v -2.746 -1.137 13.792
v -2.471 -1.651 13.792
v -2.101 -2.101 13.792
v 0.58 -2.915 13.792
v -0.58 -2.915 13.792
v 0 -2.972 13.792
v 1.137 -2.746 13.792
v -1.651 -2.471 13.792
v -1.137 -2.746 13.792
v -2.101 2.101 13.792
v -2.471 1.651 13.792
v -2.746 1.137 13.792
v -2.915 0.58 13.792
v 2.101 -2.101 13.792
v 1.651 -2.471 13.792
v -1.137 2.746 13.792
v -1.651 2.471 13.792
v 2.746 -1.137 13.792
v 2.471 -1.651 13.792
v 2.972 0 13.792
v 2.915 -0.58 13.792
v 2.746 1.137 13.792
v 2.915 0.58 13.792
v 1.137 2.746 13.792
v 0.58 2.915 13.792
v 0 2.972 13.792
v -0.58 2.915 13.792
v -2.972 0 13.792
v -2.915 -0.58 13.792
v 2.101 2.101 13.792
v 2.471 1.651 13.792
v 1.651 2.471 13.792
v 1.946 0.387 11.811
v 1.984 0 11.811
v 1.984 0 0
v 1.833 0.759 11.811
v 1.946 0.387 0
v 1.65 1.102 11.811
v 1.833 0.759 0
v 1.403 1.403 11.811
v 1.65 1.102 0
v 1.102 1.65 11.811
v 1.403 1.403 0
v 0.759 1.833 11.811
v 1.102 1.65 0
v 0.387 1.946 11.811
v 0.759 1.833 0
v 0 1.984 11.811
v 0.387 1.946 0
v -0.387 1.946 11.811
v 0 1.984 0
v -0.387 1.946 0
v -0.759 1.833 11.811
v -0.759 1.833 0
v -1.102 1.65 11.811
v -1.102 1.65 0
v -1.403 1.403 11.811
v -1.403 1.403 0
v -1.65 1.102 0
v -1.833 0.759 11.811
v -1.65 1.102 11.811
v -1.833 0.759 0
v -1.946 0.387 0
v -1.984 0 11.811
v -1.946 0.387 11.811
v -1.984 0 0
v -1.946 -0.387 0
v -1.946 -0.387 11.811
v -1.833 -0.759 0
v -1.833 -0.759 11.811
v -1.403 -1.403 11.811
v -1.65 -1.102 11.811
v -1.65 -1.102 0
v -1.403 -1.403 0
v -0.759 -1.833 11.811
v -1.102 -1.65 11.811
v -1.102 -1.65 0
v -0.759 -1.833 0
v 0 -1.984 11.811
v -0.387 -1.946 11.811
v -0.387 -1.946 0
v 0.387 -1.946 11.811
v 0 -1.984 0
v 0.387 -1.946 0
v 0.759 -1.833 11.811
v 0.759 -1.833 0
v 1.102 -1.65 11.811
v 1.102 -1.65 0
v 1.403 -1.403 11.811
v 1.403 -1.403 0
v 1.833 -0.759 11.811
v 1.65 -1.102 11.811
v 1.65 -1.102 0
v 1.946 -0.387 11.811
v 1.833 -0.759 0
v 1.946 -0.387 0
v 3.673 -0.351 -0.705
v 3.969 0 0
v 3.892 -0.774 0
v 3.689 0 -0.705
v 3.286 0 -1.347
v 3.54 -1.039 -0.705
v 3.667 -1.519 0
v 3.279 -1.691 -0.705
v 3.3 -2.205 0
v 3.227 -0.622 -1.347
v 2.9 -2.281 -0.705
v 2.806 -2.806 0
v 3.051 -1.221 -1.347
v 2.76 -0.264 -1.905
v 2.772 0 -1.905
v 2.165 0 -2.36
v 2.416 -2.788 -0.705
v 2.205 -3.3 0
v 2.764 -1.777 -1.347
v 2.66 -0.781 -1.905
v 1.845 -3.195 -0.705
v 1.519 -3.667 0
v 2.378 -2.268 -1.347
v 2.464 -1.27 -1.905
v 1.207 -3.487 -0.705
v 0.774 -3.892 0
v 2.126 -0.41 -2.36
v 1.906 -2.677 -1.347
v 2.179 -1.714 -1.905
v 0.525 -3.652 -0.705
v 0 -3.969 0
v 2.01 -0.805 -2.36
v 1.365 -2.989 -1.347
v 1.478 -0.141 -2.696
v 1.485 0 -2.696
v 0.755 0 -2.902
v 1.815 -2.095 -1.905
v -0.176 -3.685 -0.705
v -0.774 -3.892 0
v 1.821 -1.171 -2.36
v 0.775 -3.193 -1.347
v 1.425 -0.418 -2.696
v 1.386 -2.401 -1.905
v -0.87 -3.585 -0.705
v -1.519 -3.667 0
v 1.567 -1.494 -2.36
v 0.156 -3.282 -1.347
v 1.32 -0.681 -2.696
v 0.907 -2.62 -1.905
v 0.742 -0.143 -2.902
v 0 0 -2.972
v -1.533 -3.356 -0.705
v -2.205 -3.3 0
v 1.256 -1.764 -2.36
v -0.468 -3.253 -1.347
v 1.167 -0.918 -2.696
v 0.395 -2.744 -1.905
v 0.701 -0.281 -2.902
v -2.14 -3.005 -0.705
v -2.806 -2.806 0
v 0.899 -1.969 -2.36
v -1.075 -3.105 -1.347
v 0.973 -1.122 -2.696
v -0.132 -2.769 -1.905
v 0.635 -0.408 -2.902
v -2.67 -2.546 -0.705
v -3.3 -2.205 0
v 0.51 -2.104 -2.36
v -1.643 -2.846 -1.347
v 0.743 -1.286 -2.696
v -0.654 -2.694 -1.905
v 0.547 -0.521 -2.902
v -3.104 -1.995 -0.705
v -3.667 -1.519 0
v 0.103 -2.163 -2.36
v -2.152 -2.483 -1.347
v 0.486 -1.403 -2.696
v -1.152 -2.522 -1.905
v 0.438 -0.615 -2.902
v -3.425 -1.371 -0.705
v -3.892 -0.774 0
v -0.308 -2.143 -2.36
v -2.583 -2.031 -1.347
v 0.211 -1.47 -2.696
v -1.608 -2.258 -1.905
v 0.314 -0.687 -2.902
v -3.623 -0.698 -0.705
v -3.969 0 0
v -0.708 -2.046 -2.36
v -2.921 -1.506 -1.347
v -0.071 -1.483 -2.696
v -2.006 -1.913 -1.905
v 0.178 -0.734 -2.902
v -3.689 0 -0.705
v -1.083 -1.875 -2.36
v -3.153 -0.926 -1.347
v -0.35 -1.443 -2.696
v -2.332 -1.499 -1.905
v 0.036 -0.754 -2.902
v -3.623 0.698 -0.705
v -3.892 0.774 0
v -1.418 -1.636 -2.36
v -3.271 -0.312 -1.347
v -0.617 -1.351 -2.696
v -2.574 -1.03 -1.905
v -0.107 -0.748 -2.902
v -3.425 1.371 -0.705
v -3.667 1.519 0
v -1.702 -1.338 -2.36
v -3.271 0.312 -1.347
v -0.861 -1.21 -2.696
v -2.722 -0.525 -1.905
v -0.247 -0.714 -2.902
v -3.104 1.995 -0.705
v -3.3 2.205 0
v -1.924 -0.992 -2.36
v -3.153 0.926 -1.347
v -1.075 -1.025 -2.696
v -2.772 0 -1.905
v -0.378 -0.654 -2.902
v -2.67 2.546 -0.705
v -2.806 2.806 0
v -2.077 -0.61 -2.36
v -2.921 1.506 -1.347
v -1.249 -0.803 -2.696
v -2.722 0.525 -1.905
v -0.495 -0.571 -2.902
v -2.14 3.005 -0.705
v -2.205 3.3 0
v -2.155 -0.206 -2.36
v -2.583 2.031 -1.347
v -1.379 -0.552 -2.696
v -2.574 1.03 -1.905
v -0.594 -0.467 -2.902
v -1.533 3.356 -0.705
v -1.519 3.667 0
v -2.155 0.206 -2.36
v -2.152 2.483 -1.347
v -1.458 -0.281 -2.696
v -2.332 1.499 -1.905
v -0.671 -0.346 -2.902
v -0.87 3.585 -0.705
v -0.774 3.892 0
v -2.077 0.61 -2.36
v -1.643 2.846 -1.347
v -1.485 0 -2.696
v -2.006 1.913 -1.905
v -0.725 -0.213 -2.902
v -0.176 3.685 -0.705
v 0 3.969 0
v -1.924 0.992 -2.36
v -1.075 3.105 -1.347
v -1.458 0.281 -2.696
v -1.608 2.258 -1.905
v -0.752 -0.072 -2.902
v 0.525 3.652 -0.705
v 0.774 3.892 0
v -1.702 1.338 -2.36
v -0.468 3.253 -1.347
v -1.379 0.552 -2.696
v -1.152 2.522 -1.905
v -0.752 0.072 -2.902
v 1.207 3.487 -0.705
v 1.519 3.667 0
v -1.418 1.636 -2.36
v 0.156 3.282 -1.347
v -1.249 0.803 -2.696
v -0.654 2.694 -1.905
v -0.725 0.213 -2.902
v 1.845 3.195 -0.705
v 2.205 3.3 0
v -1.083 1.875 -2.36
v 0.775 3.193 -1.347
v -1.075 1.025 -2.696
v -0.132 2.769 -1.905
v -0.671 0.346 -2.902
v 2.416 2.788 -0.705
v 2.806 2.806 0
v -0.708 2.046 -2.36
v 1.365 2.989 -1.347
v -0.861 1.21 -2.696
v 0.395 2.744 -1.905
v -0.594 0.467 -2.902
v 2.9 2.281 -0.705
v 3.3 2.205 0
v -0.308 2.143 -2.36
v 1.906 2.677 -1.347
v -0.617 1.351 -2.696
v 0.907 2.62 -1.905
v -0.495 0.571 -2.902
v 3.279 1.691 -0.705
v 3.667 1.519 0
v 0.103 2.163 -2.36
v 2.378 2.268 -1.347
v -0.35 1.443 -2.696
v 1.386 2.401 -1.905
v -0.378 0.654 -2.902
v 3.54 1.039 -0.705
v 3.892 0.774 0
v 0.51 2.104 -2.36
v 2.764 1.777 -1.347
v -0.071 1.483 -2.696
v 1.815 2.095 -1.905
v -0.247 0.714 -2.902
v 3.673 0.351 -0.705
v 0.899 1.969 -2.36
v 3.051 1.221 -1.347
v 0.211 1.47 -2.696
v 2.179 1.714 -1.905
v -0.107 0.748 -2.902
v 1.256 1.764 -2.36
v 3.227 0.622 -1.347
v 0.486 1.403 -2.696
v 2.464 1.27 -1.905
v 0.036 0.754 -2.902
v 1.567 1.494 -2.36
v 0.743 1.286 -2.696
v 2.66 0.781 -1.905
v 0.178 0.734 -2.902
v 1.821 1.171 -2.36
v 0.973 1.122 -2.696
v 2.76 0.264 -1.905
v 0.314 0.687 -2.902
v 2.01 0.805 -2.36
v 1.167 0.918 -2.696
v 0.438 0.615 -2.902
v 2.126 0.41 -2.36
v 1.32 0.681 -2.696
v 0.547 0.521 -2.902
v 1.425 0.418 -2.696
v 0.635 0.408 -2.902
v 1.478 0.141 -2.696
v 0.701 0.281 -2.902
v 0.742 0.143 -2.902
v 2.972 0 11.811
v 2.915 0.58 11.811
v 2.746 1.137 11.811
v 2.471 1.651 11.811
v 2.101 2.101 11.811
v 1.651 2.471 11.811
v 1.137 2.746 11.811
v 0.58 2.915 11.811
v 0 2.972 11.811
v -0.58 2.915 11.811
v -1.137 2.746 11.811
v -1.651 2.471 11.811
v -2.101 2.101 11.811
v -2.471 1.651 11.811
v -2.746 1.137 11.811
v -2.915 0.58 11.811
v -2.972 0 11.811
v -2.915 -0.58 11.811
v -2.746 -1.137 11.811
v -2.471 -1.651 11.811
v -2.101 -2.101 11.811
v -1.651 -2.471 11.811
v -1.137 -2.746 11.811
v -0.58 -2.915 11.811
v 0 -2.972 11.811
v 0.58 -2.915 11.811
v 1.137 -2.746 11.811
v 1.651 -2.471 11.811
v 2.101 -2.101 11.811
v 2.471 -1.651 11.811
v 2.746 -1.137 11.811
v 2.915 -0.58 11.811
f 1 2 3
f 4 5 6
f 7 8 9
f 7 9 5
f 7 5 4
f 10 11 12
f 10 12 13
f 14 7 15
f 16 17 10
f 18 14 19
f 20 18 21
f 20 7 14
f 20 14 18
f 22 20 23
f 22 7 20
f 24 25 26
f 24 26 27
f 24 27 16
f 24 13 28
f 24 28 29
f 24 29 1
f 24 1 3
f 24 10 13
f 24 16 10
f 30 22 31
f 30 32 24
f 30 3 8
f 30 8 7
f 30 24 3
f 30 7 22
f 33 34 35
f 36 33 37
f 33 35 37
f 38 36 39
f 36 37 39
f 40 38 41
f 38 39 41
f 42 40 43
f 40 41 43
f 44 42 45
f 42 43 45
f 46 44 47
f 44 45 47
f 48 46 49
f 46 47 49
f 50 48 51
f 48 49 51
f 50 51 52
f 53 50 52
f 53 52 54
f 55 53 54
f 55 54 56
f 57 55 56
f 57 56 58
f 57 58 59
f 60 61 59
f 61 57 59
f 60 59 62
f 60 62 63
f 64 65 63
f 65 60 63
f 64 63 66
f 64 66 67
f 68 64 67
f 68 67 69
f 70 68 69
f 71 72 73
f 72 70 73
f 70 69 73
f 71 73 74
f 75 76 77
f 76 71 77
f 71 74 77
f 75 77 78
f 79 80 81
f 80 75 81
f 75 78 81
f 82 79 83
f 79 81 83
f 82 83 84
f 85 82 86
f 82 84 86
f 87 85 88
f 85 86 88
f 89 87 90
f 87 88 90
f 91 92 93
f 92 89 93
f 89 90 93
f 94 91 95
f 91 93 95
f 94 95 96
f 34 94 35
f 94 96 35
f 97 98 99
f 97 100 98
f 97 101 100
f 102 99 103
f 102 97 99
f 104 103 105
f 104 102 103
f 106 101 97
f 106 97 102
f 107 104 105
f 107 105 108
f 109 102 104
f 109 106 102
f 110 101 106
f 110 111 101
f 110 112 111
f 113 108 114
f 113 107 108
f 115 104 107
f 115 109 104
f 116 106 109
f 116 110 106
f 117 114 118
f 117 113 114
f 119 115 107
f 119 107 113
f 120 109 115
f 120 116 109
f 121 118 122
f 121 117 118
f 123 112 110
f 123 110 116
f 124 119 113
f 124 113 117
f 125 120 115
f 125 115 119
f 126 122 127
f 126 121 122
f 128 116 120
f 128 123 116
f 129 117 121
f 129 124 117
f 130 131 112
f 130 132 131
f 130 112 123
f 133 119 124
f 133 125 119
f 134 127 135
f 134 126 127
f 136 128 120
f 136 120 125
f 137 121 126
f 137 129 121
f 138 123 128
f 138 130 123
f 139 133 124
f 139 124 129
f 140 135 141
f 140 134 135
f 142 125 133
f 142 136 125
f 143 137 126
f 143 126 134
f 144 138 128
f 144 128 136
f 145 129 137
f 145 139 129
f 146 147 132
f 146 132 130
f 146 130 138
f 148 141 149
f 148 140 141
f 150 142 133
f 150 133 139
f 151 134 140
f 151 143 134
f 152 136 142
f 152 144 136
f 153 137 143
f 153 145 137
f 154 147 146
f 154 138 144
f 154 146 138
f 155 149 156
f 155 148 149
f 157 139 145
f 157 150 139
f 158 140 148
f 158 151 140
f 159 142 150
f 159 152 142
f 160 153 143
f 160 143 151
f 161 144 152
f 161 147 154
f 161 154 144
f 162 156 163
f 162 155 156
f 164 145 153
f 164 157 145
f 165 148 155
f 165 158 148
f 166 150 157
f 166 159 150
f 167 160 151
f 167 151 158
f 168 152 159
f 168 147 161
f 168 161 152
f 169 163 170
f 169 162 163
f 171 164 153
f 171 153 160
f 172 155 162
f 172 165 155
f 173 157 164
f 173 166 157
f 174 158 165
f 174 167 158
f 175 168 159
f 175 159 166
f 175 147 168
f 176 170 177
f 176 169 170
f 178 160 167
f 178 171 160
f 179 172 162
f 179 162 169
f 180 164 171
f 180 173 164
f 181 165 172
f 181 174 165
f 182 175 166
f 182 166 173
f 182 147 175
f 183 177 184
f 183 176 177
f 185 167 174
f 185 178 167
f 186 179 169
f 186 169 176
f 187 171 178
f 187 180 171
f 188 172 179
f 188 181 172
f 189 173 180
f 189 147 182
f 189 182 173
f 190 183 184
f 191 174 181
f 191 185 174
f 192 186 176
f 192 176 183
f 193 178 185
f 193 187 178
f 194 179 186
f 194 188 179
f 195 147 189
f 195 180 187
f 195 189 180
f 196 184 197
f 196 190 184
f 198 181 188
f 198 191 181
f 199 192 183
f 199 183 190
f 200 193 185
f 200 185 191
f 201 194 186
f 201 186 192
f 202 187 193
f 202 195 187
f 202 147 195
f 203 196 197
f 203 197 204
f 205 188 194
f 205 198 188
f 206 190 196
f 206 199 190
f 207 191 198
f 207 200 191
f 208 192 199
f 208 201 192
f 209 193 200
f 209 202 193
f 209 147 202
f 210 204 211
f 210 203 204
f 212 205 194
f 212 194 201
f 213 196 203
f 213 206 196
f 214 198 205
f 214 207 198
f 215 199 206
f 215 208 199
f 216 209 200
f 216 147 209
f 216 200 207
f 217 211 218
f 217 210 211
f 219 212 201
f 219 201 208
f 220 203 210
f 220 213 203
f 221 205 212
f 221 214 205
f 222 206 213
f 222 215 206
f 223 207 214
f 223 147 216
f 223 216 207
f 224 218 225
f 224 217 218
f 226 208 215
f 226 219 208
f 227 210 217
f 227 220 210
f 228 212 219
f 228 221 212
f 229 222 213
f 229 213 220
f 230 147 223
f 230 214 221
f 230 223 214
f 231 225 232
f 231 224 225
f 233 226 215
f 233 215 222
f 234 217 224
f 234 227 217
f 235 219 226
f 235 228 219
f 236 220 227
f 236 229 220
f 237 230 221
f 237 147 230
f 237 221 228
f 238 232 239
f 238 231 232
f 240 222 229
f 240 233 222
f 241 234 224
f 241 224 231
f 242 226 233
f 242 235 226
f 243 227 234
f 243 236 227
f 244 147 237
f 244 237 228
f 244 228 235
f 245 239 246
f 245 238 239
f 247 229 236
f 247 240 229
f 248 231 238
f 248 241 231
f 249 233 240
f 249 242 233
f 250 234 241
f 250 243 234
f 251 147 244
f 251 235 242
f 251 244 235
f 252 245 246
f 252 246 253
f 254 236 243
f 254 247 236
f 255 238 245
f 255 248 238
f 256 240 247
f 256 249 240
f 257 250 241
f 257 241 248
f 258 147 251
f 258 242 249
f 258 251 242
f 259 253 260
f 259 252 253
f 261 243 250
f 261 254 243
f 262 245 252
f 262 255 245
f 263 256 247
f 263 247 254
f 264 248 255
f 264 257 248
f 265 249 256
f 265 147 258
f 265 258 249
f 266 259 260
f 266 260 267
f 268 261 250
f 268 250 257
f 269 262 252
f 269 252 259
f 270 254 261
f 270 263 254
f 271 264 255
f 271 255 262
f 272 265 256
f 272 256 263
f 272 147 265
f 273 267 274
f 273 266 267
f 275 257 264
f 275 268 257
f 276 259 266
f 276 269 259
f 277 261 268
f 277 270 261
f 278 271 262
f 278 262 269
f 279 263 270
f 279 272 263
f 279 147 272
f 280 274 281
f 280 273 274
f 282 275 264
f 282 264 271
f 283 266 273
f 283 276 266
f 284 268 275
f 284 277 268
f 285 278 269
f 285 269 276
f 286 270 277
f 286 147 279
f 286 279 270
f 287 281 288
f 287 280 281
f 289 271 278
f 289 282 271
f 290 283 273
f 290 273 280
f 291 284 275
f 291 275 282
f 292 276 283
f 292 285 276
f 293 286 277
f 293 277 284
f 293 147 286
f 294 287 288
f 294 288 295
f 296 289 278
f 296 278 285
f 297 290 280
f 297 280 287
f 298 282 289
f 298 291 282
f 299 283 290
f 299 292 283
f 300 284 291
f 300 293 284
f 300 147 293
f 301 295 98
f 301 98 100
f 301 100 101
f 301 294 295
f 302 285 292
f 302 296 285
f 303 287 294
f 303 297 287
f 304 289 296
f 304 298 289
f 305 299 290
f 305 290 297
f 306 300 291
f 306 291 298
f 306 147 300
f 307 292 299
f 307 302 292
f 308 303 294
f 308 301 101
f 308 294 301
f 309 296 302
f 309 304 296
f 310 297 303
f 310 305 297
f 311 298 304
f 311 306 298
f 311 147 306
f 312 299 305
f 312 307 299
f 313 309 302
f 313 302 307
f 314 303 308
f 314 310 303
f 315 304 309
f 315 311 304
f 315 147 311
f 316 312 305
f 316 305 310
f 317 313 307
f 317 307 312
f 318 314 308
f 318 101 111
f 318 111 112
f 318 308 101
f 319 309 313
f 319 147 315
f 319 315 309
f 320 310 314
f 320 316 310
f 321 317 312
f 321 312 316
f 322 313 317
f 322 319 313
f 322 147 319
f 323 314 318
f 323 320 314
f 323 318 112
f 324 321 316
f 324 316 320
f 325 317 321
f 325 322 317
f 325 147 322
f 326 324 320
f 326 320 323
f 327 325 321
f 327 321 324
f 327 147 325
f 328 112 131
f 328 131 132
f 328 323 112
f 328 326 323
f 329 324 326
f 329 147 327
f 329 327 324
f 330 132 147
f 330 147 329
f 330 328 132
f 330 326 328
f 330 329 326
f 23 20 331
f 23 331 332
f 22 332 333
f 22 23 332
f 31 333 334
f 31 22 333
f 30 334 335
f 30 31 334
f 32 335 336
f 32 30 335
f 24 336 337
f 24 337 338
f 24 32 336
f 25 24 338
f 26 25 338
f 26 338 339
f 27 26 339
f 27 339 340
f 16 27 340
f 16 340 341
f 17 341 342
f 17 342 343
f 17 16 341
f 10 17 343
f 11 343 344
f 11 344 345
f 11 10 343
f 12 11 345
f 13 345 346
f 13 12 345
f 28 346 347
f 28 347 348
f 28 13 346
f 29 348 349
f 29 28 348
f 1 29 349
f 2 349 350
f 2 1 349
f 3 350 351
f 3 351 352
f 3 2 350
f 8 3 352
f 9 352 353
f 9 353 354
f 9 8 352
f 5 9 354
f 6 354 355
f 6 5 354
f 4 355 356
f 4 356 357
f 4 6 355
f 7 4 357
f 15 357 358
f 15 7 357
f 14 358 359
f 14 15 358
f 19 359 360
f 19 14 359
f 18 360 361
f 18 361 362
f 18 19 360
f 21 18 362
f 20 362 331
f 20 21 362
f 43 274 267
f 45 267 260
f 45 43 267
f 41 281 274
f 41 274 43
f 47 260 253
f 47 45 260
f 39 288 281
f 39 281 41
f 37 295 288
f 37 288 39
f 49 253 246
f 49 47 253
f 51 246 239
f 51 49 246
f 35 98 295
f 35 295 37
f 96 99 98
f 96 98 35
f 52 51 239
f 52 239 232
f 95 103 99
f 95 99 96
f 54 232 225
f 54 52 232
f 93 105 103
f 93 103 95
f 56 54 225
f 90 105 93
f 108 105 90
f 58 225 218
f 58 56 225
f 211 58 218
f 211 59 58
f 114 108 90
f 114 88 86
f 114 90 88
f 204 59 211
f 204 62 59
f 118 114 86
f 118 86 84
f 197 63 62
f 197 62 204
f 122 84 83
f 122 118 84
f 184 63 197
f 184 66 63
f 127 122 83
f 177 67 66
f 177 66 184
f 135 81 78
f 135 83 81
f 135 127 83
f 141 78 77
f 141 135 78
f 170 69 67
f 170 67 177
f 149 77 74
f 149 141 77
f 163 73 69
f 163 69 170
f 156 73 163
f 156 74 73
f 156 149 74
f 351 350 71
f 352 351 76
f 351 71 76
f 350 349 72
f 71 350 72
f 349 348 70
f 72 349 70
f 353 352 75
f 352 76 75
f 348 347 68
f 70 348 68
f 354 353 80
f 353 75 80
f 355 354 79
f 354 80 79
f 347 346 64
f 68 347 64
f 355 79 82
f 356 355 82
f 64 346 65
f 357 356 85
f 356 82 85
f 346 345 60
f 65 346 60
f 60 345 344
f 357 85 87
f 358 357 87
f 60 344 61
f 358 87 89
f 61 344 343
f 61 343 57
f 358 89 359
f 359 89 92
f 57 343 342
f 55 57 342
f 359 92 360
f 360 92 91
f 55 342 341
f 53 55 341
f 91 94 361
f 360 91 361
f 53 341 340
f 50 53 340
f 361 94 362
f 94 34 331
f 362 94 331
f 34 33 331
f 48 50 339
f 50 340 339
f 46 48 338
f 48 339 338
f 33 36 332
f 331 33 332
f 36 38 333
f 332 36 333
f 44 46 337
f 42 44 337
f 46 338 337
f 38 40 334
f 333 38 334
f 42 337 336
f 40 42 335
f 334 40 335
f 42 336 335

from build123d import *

# Parameters (mm, degrees)
SKETCH1_R        = 1.984375
EXT_SHANK_DEPTH  = 13.7922
SKETCH3_R        = 2.9718
EXT_CLINCH_DEPTH = 1.9812


with BuildPart() as part:
    # Sketch1 → Ext Shank (new body)
    with BuildSketch(Plane.XY):
        Circle(SKETCH1_R)
    extrude(amount=EXT_SHANK_DEPTH)

    # Sketch2 → Rev Head (revolve)
    with BuildSketch(Plane(origin=(0, 0, 0), x_dir=(1, 0, 0), z_dir=(0, 1, 0))):
        with BuildLine():
            Line((0, 2.9718), (0, 0))
            Line((0, 0), (3.96875, 0))
            ThreePointArc((3.96875, 0), (2.479040732, 2.146511287), (0, 2.9718))
        make_face()
    revolve(axis=Axis((0, 0, 0), (0, 0, -1)))

    # Sketch3 → Ext Clinch (add)
    with BuildSketch(Plane.XY.offset(13.7922)):
        Circle(SKETCH3_R)
    extrude(amount=-EXT_CLINCH_DEPTH)


solid = part.part
